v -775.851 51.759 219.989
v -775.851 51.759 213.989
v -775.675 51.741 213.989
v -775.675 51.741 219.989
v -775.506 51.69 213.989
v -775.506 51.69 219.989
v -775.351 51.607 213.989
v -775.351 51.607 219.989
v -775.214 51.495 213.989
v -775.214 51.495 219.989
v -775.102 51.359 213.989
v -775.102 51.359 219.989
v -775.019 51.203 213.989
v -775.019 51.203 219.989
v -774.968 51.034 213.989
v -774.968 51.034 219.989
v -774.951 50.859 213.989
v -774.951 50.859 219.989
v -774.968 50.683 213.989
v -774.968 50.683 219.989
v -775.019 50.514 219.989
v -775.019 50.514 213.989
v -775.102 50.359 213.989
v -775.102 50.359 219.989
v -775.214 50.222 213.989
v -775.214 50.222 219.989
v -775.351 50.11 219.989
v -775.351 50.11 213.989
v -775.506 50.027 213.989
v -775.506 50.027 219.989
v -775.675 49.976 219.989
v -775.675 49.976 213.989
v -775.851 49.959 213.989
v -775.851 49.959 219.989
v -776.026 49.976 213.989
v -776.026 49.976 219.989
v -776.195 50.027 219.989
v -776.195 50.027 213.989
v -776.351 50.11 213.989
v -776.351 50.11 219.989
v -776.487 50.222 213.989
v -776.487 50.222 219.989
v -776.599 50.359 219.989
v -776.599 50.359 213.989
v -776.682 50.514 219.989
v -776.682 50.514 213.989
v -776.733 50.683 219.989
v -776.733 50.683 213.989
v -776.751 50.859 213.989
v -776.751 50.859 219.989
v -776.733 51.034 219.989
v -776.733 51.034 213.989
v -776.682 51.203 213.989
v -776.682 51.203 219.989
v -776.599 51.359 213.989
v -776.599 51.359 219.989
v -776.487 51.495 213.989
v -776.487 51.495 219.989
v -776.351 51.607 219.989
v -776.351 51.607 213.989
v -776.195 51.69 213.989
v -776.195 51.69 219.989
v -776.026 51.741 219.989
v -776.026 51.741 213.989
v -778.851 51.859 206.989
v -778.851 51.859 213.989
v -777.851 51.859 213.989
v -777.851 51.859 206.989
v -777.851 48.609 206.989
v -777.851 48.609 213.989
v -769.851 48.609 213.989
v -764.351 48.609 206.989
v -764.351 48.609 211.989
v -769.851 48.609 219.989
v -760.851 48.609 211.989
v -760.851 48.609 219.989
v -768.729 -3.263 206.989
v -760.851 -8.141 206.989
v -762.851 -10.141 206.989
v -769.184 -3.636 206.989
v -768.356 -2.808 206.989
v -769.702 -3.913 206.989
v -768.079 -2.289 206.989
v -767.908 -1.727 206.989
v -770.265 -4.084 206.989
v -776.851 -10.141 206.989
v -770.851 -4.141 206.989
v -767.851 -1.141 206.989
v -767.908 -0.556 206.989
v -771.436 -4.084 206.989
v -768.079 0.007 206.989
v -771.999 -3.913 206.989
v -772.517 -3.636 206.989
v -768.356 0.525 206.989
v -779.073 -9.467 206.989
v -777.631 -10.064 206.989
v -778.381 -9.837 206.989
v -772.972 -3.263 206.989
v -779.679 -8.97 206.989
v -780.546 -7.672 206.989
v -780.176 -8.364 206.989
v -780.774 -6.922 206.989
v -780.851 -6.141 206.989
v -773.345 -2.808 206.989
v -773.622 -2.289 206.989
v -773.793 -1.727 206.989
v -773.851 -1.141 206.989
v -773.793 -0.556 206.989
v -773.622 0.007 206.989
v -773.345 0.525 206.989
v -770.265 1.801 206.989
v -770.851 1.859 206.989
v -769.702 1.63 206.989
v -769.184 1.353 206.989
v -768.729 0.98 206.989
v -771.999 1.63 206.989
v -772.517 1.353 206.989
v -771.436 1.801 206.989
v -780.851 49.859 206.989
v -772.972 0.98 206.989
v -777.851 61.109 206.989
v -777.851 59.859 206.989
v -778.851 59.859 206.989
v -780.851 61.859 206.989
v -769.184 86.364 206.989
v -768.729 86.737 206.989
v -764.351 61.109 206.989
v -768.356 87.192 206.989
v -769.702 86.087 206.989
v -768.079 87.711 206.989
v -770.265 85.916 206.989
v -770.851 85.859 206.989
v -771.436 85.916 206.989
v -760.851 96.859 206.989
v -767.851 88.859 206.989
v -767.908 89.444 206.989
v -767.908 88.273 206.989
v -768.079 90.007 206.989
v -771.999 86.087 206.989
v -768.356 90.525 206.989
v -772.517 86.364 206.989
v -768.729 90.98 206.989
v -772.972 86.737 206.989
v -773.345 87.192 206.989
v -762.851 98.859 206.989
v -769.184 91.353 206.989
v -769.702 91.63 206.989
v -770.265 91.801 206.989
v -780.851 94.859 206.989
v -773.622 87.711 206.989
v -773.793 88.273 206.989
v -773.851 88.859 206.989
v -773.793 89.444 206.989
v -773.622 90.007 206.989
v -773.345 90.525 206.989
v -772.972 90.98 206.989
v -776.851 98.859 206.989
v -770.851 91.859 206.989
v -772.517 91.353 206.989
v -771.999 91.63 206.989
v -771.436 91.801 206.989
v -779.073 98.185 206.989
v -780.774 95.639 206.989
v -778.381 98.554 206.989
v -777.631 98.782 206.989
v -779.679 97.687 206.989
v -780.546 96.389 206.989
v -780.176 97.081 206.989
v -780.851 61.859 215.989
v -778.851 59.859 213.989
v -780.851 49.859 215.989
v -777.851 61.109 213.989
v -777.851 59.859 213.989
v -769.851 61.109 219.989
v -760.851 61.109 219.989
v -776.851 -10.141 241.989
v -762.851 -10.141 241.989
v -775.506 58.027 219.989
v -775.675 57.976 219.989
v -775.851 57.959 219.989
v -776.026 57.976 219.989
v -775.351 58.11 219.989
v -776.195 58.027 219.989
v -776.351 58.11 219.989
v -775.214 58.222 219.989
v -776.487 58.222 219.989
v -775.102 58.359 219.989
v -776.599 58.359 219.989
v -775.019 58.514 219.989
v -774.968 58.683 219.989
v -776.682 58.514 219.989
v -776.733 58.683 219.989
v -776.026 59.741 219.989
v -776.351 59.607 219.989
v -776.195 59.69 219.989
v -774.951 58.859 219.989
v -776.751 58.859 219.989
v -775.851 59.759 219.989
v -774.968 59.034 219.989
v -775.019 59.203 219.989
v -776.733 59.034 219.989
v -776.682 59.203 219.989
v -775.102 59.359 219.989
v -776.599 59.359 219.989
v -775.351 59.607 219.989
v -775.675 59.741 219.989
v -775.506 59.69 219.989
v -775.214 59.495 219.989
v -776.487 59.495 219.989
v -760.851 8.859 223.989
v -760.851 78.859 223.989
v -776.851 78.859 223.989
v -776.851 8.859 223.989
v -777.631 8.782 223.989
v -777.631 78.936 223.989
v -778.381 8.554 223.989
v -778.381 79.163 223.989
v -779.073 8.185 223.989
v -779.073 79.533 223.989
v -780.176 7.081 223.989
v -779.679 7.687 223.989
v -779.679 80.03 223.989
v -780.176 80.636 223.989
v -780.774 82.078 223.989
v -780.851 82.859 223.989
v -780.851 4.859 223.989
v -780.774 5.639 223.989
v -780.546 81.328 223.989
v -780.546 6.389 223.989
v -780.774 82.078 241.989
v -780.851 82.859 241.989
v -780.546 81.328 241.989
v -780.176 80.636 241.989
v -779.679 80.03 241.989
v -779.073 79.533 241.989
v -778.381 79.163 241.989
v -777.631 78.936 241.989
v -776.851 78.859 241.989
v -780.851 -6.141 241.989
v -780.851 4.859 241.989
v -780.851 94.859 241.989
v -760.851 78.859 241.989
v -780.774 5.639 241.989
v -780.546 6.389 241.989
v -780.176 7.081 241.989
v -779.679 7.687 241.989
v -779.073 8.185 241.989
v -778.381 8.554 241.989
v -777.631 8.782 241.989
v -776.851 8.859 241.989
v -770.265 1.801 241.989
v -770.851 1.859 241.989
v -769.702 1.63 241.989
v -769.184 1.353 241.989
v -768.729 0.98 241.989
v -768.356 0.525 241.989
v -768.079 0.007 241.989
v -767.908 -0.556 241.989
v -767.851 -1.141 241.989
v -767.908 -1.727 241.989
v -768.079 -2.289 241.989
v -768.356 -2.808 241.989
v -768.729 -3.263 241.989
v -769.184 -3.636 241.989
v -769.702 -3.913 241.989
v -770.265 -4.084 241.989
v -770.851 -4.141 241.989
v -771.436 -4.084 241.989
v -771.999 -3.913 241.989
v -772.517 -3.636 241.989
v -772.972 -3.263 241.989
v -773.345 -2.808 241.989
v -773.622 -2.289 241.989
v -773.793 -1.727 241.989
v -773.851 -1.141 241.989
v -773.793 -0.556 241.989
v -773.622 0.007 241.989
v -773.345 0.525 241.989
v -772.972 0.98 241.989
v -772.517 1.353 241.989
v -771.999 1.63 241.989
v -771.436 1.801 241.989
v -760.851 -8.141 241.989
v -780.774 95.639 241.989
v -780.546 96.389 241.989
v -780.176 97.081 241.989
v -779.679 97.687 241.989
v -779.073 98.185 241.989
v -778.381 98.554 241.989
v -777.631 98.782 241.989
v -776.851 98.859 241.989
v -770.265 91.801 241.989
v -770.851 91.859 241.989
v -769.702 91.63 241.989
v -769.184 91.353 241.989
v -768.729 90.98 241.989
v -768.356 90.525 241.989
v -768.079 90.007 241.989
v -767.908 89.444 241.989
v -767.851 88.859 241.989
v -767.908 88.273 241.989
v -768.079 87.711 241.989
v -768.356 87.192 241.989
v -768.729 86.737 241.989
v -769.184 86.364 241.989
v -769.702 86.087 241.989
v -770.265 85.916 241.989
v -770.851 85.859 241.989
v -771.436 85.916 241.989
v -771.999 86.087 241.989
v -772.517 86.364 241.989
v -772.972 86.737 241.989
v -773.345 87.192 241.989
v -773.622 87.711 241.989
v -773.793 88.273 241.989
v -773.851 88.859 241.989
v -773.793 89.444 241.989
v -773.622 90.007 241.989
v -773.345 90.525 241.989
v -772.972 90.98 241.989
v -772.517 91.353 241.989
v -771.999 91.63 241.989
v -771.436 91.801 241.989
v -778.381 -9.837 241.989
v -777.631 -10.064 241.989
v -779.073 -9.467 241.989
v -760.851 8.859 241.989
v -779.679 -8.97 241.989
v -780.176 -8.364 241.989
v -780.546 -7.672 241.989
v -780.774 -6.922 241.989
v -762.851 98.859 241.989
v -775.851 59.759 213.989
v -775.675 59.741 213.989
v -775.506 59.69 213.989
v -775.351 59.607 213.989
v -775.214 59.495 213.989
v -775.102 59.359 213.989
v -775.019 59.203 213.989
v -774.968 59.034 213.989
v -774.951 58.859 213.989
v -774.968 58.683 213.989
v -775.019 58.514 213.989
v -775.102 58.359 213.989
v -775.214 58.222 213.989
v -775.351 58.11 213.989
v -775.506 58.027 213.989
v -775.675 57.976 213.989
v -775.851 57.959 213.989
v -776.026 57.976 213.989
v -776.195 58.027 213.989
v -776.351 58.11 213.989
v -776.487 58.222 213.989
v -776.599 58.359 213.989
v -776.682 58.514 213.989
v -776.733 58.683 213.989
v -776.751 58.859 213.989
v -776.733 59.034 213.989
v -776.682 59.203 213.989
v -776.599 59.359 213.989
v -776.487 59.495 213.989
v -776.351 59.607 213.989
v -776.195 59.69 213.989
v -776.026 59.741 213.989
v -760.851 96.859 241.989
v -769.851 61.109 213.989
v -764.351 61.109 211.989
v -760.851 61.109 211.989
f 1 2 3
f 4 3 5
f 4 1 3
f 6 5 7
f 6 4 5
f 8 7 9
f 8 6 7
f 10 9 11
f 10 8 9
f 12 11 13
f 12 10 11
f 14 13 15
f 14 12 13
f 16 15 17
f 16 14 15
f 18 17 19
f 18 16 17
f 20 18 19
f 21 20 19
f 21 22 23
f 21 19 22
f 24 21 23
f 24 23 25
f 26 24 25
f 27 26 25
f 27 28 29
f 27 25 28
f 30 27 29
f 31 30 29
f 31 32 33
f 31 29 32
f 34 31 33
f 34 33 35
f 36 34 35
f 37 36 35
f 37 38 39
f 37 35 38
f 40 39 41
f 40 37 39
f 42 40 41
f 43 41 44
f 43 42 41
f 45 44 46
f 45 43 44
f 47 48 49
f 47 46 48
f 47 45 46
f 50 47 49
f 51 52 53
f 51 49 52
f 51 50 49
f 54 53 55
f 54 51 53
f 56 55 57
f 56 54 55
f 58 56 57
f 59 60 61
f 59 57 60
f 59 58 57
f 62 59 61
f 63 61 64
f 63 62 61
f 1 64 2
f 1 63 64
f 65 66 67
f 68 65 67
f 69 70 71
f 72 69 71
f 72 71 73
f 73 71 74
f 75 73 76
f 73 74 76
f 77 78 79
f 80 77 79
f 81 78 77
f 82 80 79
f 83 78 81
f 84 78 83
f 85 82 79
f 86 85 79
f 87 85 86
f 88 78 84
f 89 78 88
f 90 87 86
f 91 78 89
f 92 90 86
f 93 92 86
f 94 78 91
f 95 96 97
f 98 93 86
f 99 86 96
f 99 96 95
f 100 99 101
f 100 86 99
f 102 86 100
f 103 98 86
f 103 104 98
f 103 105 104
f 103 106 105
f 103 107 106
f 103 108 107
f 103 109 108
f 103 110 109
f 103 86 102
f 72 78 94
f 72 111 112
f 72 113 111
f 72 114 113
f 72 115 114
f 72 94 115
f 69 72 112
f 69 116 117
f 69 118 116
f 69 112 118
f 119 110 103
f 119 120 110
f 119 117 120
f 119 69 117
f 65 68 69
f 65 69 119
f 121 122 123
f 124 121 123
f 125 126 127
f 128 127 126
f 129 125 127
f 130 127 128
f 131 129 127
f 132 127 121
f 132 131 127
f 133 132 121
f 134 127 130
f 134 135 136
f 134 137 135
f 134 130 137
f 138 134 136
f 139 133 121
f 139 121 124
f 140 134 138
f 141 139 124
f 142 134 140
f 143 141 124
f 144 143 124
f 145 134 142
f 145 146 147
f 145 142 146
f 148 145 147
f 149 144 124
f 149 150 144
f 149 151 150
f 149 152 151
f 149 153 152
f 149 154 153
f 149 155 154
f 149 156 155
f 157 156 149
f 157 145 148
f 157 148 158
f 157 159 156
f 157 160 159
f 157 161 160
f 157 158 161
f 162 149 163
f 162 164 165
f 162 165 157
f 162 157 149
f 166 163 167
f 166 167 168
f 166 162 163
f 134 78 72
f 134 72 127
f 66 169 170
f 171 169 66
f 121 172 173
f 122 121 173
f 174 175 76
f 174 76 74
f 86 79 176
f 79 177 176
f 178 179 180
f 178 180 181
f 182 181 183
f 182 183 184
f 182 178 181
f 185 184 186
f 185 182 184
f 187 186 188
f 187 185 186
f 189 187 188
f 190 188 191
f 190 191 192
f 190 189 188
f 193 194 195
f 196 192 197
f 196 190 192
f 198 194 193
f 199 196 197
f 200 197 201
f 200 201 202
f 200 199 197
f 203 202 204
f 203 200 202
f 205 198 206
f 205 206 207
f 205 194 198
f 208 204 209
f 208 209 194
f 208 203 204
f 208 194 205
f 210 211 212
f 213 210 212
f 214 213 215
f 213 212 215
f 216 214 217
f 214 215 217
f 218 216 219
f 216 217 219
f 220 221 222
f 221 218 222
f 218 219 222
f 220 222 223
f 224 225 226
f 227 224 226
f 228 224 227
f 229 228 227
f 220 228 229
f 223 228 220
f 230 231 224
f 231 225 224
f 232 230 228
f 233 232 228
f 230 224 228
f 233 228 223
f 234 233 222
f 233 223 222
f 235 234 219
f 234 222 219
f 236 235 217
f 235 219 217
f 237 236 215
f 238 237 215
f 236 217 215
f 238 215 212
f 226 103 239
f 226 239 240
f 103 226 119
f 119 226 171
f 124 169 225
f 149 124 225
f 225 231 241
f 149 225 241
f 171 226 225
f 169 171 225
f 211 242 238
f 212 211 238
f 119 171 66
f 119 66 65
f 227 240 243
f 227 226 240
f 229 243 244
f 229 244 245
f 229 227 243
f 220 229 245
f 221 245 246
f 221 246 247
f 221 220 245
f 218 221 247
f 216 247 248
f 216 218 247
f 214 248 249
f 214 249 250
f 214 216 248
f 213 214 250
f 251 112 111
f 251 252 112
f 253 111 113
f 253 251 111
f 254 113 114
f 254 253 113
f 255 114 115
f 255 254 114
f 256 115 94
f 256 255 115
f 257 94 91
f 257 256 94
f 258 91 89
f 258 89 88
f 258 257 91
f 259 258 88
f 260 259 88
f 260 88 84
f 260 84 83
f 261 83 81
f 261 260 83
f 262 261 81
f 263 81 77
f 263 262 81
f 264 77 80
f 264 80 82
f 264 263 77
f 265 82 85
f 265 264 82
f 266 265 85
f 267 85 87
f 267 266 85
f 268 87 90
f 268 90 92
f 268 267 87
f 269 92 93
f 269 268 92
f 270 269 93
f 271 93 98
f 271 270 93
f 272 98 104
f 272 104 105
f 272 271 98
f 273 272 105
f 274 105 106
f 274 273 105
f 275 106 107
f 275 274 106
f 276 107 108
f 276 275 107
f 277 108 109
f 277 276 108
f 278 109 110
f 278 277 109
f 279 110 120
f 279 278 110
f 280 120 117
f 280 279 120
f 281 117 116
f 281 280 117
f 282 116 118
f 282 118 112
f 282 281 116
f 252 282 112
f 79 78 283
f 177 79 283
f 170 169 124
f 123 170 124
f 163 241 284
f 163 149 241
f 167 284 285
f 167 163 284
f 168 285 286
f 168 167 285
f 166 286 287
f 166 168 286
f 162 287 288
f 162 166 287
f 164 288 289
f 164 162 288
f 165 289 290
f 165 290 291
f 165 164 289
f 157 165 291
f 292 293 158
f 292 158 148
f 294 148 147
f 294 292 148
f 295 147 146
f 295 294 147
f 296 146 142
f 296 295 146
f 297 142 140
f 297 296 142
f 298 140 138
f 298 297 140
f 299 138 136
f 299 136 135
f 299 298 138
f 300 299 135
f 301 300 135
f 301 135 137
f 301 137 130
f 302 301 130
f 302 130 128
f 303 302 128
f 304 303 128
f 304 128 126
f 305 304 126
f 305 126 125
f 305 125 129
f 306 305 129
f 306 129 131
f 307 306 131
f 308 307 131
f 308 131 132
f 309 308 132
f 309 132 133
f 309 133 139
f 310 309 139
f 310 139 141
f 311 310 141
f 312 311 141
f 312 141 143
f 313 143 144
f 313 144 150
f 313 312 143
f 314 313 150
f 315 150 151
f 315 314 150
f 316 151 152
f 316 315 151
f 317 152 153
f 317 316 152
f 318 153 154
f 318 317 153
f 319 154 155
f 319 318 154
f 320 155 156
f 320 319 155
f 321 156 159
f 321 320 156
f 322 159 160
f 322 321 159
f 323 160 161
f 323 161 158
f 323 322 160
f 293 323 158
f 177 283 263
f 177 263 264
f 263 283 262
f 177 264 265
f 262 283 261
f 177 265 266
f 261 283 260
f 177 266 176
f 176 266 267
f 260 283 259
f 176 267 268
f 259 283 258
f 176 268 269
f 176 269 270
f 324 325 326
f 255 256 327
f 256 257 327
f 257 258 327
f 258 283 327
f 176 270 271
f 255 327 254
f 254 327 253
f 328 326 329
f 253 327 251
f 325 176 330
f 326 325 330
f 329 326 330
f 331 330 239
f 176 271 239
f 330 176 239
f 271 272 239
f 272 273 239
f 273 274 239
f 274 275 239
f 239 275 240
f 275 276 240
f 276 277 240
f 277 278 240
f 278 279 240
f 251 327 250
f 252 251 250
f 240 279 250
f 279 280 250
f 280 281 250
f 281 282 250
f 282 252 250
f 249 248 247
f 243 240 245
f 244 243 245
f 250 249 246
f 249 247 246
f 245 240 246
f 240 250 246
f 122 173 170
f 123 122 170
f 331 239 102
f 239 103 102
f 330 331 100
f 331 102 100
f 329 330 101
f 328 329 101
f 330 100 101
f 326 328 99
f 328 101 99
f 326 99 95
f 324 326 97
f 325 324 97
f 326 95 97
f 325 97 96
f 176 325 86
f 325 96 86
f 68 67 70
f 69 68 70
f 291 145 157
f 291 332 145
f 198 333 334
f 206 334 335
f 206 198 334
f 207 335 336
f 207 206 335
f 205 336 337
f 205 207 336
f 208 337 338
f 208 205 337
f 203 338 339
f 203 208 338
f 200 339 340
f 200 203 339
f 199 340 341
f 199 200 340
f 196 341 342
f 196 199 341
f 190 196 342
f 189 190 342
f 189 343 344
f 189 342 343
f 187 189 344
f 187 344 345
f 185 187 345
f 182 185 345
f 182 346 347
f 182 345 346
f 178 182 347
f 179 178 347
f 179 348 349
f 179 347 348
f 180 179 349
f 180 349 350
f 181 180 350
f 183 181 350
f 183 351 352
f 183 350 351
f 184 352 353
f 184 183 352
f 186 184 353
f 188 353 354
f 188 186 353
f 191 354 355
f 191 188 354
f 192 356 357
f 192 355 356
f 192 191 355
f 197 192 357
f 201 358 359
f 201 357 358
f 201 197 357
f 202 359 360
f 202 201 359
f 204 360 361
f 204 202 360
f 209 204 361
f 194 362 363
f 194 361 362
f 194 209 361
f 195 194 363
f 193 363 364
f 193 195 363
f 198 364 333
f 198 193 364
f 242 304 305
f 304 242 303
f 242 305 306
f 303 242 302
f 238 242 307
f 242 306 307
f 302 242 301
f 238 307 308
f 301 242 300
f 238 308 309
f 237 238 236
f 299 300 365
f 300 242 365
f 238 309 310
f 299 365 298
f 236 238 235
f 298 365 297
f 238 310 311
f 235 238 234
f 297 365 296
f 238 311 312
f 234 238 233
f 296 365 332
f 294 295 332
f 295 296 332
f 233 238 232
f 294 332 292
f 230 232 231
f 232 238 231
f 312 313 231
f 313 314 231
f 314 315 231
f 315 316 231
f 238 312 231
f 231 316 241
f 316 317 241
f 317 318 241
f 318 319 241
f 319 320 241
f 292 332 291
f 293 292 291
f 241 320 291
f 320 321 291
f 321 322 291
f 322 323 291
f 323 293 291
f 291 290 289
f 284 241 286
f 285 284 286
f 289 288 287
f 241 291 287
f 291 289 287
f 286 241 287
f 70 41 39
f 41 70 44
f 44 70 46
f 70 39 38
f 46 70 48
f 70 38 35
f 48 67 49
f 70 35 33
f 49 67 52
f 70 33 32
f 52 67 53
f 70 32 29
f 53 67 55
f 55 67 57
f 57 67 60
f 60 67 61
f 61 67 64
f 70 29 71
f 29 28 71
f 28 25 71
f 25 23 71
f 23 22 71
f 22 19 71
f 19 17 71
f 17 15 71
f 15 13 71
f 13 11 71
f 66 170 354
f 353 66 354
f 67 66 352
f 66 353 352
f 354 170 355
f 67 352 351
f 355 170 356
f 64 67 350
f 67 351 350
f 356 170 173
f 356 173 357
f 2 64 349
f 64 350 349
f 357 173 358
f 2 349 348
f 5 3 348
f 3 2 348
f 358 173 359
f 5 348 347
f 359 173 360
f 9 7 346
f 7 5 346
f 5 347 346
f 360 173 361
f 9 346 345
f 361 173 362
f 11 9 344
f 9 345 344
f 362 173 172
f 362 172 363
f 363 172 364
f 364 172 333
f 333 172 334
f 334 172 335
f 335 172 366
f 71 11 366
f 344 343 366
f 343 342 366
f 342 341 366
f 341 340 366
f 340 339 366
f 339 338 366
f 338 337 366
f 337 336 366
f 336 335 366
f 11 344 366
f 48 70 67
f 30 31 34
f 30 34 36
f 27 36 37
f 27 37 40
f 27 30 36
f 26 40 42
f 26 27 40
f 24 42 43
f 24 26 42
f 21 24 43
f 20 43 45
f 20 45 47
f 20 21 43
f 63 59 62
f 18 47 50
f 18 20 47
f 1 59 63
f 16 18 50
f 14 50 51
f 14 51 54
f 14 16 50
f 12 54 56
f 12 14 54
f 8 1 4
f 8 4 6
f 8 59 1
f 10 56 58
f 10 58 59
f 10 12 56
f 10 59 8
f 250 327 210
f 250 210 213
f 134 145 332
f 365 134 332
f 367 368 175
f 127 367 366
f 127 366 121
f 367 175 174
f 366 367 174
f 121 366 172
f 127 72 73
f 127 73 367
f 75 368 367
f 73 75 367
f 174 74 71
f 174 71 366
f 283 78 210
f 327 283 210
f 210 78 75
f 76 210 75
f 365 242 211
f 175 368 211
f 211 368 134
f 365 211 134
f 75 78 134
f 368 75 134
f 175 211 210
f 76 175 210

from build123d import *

# Parameters (mm, degrees)
SKETCH_1_W          = 20
SKETCH_1_H          = 19
SKETCH_1_R          = 3
EXTRUDE_1_DEPTH     = 18
SKETCH_1_H_2        = 20
EXTRUDE_1_2_DEPTH   = 18
SKETCH_2_W          = 20
SKETCH_2_H          = 109
SKETCH_2_R          = 3
EXTRUDE_2_DEPTH     = 4
EXTRUDE_3_DEPTH     = 6
SKETCH_4_R          = 0.9
CUT_EXTRUDE_1_DEPTH = 788.391009845
SKETCH_5_R          = 3
EXTRUDE_4_DEPTH     = 13
CHAMFER_1_SIZE      = 2
SKETCH_6_W          = 3.5
SKETCH_6_H          = 12.5
EXTRUDE_5_DEPTH     = 5
FILLET_1_R          = 4
CHAMFER_2_SIZE      = 2


with BuildPart() as part:
    # Эскиз1 → Бобышка-Вытянуть1 (new body)
    with BuildSketch(Plane(origin=(0, 0, 241.9894311), x_dir=(-1, 0, 0), z_dir=(0, 0, -1))):
        with Locations((770.850538245, -0.64131648)):
            Rectangle(SKETCH_1_W, SKETCH_1_H)
        with Locations(Location((770.850538245, -1.14131648, 0), (0, 0, 90))):
            Circle(SKETCH_1_R, mode=Mode.SUBTRACT)
    extrude(amount=EXTRUDE_1_DEPTH)



with BuildPart() as body_2:
    # Эскиз1 → Extrude 1 2 (new body)
    with BuildSketch(Plane(origin=(0, 0, 241.9894311), x_dir=(-1, 0, 0), z_dir=(0, 0, -1))):
        with Locations((770.850538245, 88.85868352)):
            Rectangle(SKETCH_1_W, SKETCH_1_H_2)
        with Locations(Location((770.850538245, 88.85868352, 0), (0, 0, 90))):
            Circle(SKETCH_1_R, mode=Mode.SUBTRACT)
    extrude(amount=EXTRUDE_1_2_DEPTH)


with BuildPart() as part_1:
    add(part.part)

    add(body_2.part)  # Бобышка-Вытянуть2 merges body 2
    # Эскиз2 → Бобышка-Вытянуть2 (add)
    with BuildSketch(Plane(origin=(0, 0, 223.9894311), x_dir=(-1, 0, 0), z_dir=(0, 0, -1))):
        with Locations((770.850538245, 44.35868352)):
            Rectangle(SKETCH_2_W, SKETCH_2_H)
        with Locations(Location((770.850538245, 88.85868352, 0), (0, 0, 90))):
            Circle(SKETCH_2_R, mode=Mode.SUBTRACT)
        with Locations(Location((770.850538245, -1.14131648, 0), (0, 0, 90))):
            Circle(SKETCH_2_R, mode=Mode.SUBTRACT)
    extrude(amount=EXTRUDE_2_DEPTH)

    # Эскиз3 → Бобышка-Вытянуть3 (add)
    with BuildSketch(Plane(origin=(0, 0, 219.9894311), x_dir=(-1, 0, 0), z_dir=(0, 0, -1))):
        Polygon((780.850538245, 59.85868352), (780.850538245, 51.85868352), (777.850538245, 51.85868352), (777.850538245, 48.60868352), (769.850538245, 48.60868352), (769.850538245, 61.10868352), (777.850538245, 61.10868352), (777.850538245, 59.85868352), align=None)
    extrude(amount=EXTRUDE_3_DEPTH)

    # Эскиз4 → Вырез-Вытянуть1 (cut, through all)
    with BuildSketch(Plane(origin=(0, 0, 219.9894311), x_dir=(-1, 0, 0), z_dir=(0, 0, -1))):
        with Locations(Location((775.850538245, 50.85868352, 0), (0, 0, 90))):
            Circle(SKETCH_4_R)
        with Locations(Location((775.850538245, 58.85868352, 0), (0, 0, 90))):
            Circle(SKETCH_4_R)
    extrude(amount=CUT_EXTRUDE_1_DEPTH, mode=Mode.SUBTRACT)

    # Эскиз5 → Бобышка-Вытянуть4 (add)
    # profile 1 of 2: a face of its own
    with BuildSketch(Plane(origin=(0, 0, 219.9894311), x_dir=(-1, 0, 0), z_dir=(0, 0, -1))):
        Polygon((760.850538245, -10.14131648), (780.850538245, -10.14131648), (780.850538245, 51.85868352), (777.850538245, 51.85868352), (777.850538245, 48.60868352), (760.850538245, 48.60868352), align=None)
        with Locations(Location((770.850538245, -1.14131648, 0), (0, 0, 90))):
            Circle(SKETCH_5_R, mode=Mode.SUBTRACT)
    # profile 2 of 2: a face of its own
    with BuildSketch(Plane(origin=(0, 0, 219.9894311), x_dir=(-1, 0, 0), z_dir=(0, 0, -1))):
        Polygon((777.850538245, 61.10868352), (777.850538245, 59.85868352), (780.850538245, 59.85868352), (780.850538245, 98.85868352), (760.850538245, 98.85868352), (760.850538245, 61.10868352), align=None)
        with Locations(Location((770.850538245, 88.85868352, 0), (0, 0, 90))):
            Circle(SKETCH_5_R, mode=Mode.SUBTRACT)
    extrude(amount=EXTRUDE_4_DEPTH)

    # Фаска1
    chamfer_1_edges = [part_1.edges().sort_by_distance(p)[0] for p in [
        (-780.850538245, 59.85868352, 210.4894311),
        (-780.850538245, 55.85868352, 213.9894311),
        (-780.850538245, 51.85868352, 210.4894311),
    ]]
    chamfer(chamfer_1_edges, length=CHAMFER_1_SIZE)

    # Эскиз6 → Бобышка-Вытянуть5 (add)
    with BuildSketch(Plane(origin=(0, 0, 206.9894311), x_dir=(-1, 0, 0), z_dir=(0, 0, -1))):
        with Locations((762.600538245, 54.85868352)):
            Rectangle(SKETCH_6_W, SKETCH_6_H)
    extrude(amount=-EXTRUDE_5_DEPTH)

    # Скругление1
    fillet_1_edges = [part_1.edges().sort_by_distance(p)[0] for p in [
        (-780.850538245, 98.85868352, 224.4894311),
        (-780.850538245, 78.85868352, 232.9894311),
        (-780.850538245, 8.85868352, 232.9894311),
        (-780.850538245, -10.14131648, 224.4894311),
    ]]
    fillet(fillet_1_edges, radius=FILLET_1_R)

    # Фаска2
    chamfer_2_edges = [part_1.edges().sort_by_distance(p)[0] for p in [
        (-760.850538245, 98.85868352, 224.4894311),
        (-760.850538245, -10.14131648, 224.4894311),
    ]]
    chamfer(chamfer_2_edges, length=CHAMFER_2_SIZE)


solid = part_1.part
